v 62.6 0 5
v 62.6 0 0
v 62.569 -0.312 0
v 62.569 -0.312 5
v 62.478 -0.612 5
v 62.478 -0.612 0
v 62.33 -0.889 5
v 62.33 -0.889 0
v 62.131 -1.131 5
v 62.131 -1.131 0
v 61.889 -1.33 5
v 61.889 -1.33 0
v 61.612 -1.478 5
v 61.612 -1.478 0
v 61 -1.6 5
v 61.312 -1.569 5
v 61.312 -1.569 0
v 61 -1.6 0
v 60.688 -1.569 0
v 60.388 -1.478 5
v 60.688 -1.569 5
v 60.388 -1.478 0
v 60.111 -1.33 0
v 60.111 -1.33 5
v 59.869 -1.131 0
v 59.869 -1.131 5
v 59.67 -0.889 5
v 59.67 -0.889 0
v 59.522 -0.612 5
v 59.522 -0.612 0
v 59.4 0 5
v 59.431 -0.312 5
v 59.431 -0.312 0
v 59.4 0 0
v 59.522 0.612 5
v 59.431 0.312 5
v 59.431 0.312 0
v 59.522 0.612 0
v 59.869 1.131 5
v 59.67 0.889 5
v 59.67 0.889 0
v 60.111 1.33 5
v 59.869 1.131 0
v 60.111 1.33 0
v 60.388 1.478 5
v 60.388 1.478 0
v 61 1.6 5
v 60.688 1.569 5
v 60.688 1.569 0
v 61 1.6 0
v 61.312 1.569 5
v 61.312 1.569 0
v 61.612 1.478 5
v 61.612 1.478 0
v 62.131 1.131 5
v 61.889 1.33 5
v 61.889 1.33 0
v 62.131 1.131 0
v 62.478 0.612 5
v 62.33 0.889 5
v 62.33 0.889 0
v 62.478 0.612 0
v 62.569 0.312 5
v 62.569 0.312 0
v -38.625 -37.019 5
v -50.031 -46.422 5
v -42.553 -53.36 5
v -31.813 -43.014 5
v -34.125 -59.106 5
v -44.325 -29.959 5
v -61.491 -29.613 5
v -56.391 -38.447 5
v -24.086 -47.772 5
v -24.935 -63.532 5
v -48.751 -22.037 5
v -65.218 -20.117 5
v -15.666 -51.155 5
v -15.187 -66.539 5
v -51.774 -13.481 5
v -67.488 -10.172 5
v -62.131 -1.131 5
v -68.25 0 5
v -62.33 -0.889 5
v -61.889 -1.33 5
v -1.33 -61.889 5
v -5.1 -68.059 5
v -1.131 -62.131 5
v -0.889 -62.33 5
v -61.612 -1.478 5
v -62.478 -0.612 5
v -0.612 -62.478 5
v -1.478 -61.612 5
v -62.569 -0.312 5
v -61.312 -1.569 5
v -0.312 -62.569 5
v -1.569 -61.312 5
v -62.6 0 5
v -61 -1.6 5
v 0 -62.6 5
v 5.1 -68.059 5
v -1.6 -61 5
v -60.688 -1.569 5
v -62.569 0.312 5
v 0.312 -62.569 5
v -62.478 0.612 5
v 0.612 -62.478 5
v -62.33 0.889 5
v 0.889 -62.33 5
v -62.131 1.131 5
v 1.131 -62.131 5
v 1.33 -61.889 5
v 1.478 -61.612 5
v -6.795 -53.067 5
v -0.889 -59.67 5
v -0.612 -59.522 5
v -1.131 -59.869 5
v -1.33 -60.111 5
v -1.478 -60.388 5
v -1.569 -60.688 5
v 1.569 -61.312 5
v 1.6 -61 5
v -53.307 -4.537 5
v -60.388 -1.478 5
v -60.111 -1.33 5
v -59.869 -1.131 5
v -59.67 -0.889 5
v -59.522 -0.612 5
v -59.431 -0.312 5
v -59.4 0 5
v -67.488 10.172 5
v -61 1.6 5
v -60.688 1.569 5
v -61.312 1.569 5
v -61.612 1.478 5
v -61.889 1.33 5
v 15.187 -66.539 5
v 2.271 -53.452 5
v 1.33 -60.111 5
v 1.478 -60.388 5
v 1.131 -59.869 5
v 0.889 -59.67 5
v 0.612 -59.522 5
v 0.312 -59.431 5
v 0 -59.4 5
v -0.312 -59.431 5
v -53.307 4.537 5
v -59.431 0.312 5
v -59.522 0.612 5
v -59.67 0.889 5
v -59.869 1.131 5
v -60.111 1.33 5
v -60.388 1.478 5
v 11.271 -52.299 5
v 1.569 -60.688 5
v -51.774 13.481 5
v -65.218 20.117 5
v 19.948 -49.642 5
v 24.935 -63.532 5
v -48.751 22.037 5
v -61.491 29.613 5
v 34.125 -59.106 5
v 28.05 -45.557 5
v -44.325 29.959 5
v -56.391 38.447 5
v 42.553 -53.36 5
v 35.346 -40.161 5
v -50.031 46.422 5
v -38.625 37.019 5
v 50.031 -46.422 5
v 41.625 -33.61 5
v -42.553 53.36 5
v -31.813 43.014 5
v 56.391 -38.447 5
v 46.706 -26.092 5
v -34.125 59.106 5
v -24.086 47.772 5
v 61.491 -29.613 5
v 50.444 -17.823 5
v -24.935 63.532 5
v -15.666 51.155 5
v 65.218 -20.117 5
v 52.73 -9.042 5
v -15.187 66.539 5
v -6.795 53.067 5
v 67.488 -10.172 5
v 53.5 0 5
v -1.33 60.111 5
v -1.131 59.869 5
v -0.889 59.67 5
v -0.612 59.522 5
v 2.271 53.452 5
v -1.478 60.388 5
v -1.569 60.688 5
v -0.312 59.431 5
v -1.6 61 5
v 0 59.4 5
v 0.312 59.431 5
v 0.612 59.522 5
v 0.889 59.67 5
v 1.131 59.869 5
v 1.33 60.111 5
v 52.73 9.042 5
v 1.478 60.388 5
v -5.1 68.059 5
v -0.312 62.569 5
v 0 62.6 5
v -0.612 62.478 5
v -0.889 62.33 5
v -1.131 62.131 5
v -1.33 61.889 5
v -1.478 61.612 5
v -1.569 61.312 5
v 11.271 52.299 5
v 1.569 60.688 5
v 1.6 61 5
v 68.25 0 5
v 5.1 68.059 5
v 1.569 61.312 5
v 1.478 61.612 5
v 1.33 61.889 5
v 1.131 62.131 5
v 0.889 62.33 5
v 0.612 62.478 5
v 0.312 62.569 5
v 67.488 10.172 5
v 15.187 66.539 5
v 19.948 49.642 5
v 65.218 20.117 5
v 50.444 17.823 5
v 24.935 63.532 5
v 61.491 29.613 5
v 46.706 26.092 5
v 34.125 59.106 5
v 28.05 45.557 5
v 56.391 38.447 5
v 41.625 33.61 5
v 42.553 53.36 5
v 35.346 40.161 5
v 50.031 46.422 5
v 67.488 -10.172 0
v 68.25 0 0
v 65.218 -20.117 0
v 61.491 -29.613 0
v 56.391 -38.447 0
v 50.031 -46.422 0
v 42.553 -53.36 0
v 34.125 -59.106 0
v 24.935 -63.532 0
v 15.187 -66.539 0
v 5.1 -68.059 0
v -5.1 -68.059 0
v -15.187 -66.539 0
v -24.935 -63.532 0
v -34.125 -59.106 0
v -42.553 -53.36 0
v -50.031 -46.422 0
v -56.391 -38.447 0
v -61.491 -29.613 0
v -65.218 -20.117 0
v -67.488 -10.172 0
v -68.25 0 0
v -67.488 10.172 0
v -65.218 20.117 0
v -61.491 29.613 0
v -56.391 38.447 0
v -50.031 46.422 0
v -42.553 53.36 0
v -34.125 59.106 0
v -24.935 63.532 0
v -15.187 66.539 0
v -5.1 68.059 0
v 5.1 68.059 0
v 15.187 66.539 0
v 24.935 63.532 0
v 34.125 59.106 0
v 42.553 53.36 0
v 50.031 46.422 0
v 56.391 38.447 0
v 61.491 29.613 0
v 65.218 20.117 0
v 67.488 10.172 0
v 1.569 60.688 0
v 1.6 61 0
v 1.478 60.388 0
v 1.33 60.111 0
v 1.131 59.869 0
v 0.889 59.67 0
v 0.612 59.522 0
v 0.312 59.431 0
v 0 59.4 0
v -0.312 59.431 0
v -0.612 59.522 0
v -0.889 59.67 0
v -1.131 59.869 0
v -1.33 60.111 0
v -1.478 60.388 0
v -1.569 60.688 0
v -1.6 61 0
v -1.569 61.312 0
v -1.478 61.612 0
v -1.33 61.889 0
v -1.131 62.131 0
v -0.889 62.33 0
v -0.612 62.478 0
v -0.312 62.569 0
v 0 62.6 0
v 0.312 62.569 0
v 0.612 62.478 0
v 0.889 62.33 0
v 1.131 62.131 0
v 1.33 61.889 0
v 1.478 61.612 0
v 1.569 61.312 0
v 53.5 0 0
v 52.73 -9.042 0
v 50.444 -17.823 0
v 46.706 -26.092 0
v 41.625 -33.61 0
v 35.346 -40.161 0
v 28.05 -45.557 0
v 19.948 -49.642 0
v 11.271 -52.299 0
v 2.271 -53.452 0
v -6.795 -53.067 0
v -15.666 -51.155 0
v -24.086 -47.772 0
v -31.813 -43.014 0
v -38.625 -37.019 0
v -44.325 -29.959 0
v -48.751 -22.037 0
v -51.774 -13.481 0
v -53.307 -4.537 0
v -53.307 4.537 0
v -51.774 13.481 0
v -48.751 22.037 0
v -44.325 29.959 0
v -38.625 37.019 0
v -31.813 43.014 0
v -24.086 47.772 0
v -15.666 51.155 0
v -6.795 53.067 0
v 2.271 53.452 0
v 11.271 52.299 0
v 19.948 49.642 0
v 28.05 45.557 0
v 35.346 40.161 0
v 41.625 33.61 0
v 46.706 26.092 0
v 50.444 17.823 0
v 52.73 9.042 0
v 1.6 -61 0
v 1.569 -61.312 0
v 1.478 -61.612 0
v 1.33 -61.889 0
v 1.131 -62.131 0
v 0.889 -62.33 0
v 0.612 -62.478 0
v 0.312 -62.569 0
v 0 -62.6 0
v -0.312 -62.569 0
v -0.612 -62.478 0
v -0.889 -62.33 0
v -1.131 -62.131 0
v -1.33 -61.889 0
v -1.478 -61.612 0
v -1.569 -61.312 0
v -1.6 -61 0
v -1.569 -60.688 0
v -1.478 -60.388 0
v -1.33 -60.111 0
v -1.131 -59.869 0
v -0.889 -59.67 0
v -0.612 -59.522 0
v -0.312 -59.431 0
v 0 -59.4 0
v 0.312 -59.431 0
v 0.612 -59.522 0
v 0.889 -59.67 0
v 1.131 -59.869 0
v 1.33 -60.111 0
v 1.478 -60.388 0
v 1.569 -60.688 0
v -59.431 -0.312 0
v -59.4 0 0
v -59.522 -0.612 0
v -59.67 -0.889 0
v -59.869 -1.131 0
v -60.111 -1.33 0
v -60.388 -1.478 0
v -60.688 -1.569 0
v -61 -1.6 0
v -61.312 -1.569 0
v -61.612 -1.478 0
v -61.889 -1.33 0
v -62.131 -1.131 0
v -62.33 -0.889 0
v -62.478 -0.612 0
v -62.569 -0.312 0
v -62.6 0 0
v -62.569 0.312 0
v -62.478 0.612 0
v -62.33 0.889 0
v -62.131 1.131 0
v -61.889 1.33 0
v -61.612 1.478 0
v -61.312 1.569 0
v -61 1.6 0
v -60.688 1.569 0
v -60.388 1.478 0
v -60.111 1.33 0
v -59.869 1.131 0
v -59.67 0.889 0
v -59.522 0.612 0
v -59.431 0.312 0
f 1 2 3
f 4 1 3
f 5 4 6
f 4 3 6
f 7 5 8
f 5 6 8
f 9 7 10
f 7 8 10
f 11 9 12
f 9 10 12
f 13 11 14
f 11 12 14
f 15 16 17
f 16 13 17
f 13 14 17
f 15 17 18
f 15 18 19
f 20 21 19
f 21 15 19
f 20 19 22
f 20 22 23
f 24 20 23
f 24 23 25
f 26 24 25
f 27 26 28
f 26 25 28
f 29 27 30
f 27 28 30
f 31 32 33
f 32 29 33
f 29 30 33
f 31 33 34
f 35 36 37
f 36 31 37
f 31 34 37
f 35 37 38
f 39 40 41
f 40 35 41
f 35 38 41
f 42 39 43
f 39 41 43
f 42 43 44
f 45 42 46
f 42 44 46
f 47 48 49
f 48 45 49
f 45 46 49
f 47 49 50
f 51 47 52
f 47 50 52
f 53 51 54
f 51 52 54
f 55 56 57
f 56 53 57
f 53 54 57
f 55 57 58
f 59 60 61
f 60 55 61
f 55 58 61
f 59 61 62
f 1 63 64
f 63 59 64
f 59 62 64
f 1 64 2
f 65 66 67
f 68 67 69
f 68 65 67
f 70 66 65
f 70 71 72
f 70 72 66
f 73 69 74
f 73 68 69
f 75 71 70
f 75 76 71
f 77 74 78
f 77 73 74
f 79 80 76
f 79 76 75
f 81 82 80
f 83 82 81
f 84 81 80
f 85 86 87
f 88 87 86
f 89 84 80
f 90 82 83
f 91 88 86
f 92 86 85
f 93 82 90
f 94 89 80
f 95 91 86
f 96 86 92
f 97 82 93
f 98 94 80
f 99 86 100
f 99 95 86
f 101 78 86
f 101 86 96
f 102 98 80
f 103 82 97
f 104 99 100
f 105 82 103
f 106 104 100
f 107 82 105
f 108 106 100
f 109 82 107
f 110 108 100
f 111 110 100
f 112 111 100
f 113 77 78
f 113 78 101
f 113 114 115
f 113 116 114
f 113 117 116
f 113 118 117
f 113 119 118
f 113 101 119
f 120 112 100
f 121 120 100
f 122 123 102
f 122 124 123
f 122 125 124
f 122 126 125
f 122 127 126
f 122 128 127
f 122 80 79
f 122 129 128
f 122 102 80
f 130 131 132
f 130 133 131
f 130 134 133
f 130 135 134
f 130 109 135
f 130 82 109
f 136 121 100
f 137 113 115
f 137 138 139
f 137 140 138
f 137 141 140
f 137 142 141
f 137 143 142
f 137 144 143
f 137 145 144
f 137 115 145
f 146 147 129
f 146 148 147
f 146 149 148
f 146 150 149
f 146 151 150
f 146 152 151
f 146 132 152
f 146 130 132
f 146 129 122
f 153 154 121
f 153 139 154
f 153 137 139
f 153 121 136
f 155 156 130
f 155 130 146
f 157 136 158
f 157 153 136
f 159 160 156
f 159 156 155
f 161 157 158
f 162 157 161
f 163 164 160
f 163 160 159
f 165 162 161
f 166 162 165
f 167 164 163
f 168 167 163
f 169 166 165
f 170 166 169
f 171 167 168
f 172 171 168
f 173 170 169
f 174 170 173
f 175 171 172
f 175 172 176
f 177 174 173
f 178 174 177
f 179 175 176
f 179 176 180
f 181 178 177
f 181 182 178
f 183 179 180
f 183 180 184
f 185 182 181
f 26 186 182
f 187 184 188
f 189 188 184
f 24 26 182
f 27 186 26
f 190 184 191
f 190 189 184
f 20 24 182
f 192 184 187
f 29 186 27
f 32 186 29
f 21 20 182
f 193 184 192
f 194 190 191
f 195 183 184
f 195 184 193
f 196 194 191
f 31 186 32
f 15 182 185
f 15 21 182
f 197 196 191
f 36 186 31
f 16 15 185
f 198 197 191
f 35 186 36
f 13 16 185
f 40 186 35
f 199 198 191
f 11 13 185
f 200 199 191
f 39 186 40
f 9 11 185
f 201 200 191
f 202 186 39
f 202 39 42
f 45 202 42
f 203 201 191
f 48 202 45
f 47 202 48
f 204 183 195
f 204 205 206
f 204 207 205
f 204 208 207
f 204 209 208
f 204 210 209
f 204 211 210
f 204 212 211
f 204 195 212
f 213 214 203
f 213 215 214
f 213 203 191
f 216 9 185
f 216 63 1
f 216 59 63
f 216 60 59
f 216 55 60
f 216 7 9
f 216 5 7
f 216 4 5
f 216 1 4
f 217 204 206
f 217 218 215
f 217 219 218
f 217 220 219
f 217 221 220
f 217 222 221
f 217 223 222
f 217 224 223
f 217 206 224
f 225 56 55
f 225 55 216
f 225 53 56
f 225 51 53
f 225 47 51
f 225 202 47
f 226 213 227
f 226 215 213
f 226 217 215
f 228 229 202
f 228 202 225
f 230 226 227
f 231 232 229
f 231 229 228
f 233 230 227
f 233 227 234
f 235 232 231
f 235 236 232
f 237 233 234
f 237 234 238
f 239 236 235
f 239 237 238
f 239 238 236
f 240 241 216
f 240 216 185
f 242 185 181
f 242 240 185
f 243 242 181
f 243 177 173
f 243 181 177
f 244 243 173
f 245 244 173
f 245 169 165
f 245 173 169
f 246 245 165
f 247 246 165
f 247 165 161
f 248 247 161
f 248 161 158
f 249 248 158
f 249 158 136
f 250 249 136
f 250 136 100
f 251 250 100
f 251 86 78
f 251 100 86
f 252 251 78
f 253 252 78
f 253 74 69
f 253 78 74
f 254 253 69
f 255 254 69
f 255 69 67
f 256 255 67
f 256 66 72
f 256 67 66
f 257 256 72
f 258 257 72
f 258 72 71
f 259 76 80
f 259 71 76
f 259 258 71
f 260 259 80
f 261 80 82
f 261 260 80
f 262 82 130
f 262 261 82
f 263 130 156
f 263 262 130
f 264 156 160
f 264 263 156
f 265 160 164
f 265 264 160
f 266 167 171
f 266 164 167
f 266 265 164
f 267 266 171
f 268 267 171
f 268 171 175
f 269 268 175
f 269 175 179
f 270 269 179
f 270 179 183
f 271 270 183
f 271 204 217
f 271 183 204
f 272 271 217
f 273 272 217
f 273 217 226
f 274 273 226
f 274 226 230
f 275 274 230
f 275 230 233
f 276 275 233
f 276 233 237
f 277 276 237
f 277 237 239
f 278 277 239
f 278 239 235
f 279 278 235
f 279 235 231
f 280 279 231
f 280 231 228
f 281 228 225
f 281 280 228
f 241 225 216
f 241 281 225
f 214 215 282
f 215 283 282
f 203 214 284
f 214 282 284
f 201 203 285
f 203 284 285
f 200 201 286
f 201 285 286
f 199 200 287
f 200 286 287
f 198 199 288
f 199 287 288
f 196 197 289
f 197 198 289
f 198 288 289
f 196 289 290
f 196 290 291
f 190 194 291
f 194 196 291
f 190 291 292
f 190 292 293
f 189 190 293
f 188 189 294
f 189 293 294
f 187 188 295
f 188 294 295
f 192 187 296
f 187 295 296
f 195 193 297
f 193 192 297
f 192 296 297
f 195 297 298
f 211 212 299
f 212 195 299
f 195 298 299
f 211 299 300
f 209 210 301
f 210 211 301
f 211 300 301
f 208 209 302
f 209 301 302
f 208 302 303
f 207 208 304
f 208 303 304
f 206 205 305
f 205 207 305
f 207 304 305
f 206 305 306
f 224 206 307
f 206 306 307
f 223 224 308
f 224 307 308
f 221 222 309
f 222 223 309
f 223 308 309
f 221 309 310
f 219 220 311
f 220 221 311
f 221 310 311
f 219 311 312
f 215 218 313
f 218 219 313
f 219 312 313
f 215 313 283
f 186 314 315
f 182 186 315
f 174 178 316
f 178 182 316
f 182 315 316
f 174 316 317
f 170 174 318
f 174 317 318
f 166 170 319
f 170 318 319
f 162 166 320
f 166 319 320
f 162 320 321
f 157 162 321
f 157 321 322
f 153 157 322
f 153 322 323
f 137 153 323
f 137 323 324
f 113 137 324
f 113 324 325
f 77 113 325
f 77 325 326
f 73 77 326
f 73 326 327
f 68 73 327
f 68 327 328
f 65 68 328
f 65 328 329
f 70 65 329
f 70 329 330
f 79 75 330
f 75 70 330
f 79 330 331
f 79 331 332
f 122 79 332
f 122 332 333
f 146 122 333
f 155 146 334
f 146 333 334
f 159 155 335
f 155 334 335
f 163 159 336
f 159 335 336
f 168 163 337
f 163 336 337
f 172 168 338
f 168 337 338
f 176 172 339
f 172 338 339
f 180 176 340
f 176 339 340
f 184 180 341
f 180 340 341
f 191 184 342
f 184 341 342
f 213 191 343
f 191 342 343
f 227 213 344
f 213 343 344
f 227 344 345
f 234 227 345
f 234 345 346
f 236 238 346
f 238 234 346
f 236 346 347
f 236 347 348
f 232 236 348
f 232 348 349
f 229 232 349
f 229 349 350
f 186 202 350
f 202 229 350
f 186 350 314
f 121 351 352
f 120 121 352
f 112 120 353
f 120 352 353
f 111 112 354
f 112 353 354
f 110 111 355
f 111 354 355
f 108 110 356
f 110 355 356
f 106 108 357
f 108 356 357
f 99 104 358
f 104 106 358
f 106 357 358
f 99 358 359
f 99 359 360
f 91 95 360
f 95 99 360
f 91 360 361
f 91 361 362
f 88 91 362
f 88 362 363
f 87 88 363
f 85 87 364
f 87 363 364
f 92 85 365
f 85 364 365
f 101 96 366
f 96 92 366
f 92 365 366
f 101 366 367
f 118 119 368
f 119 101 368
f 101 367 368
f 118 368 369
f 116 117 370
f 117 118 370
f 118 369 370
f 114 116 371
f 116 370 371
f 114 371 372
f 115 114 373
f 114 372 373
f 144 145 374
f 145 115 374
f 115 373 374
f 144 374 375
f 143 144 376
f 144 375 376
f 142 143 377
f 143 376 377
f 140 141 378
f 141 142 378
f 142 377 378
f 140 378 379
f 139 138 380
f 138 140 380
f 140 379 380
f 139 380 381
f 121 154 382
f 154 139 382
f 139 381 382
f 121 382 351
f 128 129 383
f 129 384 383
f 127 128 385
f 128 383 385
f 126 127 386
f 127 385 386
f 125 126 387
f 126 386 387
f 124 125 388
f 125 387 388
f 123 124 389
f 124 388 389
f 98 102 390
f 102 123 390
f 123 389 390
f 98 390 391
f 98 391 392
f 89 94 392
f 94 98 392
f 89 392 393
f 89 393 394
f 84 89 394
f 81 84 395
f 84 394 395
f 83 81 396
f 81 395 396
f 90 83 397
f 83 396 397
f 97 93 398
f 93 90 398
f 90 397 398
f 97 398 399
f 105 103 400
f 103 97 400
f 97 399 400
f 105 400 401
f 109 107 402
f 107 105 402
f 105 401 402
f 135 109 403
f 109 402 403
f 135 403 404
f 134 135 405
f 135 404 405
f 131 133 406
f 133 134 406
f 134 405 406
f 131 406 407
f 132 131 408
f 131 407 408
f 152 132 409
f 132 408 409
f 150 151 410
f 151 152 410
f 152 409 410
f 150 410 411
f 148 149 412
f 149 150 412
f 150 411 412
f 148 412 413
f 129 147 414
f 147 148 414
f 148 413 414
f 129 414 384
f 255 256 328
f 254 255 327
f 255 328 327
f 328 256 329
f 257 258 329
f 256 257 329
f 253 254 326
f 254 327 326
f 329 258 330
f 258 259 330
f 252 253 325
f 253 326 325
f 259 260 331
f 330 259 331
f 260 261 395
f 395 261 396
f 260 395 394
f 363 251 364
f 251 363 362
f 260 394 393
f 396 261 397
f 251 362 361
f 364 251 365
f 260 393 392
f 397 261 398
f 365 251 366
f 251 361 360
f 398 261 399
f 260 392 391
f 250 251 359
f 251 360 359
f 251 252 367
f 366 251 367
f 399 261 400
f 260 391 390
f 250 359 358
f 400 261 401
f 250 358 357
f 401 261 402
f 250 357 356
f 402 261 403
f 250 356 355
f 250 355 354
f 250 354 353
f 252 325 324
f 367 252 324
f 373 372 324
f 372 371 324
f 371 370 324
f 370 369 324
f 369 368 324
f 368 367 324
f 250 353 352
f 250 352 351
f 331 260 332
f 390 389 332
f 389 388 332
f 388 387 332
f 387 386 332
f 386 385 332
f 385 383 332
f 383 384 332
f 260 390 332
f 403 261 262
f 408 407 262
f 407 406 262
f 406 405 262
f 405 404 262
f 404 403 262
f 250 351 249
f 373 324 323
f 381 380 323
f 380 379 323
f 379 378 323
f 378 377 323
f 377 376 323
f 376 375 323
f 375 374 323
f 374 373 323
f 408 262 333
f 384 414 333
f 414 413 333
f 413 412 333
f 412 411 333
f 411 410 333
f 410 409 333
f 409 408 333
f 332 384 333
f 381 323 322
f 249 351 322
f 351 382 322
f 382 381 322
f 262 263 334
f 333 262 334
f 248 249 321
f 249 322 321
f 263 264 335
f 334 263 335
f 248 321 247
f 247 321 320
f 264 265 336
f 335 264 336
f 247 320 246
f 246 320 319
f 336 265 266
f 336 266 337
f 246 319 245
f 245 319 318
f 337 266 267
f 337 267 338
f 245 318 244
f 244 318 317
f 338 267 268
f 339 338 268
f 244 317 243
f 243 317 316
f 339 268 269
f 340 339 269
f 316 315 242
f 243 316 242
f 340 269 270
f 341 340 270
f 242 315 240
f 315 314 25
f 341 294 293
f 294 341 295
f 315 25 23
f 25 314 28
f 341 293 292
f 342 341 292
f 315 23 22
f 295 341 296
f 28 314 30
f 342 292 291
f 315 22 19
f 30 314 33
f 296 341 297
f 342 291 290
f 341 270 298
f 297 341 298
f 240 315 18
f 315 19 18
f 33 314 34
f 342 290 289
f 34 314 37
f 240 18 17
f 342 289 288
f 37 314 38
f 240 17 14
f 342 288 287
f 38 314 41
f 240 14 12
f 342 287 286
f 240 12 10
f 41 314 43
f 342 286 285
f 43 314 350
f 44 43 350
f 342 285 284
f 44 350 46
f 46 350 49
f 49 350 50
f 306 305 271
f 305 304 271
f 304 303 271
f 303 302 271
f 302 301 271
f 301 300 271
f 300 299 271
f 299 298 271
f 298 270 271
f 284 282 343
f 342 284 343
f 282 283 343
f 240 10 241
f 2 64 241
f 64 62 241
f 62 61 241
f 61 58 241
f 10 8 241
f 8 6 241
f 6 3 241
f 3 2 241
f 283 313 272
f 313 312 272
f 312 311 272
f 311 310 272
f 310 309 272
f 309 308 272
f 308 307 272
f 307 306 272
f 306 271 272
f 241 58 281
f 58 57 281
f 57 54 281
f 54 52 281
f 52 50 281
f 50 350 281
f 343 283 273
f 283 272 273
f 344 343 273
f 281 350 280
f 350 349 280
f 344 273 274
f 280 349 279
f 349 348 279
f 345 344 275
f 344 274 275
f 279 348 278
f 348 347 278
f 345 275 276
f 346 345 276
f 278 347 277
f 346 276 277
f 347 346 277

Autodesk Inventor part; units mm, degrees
ref_plane "YZ Plane" through (0, 0, 0) normal (1, 0, 0) x (0, 1, 0)
ref_plane "XZ Plane" through (0, 0, 0) normal (0, 1, 0) x (-1, 0, 0)
ref_plane "XY Plane" through (0, 0, 0) normal (0, 0, 1) x (1, 0, 0)
sketch "스케치1" plane through (0, 0, 0) normal (0, 0, 1) x (1, 0, 0)
  circle A0 centre (0, 0) radius 68.25
  circle A1 centre (0, 0) radius 53.5
  circle A2 centre (0, 0) radius 61 construction
  circle A3 centre (0, 61) radius 1.6
  circle A4 centre (-61, 0) radius 1.6
  circle A5 centre (0, -61) radius 1.6
  circle A6 centre (61, 0) radius 1.6
  dimension "d2" = 122
  dimension "d0" = 136.5
  dimension "d1" = 107
  dimension "d3" = 3.2
  dimension "d6" = 360
extrude "돌출1" add sketch "스케치1" along normal blind 5
properties part number "아크릴 빛번짐 고정용"
